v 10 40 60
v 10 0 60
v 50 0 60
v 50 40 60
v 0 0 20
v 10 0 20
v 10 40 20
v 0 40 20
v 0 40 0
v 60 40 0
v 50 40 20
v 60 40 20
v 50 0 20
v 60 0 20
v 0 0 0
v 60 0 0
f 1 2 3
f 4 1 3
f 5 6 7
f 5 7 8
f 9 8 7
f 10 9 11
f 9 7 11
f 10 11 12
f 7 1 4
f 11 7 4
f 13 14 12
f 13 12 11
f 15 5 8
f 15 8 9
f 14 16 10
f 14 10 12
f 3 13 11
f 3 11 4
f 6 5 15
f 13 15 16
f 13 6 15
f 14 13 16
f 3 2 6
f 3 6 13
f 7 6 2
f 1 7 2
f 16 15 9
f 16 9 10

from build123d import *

# Parameters (mm, degrees)
F0_W     = 40
F0_H     = 40
F1_DEPTH = 40


with BuildPart() as f1:
    # F0 (on Front) → F1 (new body)
    with BuildSketch(Plane.XZ):
        Polygon((0, 20), (0, 0), (60, 0), (60, 20), (50, 20), (10, 20), align=None)
        with Locations((30, 40)):
            Rectangle(F0_W, F0_H)
    extrude(amount=-F1_DEPTH)


solid = f1.part
